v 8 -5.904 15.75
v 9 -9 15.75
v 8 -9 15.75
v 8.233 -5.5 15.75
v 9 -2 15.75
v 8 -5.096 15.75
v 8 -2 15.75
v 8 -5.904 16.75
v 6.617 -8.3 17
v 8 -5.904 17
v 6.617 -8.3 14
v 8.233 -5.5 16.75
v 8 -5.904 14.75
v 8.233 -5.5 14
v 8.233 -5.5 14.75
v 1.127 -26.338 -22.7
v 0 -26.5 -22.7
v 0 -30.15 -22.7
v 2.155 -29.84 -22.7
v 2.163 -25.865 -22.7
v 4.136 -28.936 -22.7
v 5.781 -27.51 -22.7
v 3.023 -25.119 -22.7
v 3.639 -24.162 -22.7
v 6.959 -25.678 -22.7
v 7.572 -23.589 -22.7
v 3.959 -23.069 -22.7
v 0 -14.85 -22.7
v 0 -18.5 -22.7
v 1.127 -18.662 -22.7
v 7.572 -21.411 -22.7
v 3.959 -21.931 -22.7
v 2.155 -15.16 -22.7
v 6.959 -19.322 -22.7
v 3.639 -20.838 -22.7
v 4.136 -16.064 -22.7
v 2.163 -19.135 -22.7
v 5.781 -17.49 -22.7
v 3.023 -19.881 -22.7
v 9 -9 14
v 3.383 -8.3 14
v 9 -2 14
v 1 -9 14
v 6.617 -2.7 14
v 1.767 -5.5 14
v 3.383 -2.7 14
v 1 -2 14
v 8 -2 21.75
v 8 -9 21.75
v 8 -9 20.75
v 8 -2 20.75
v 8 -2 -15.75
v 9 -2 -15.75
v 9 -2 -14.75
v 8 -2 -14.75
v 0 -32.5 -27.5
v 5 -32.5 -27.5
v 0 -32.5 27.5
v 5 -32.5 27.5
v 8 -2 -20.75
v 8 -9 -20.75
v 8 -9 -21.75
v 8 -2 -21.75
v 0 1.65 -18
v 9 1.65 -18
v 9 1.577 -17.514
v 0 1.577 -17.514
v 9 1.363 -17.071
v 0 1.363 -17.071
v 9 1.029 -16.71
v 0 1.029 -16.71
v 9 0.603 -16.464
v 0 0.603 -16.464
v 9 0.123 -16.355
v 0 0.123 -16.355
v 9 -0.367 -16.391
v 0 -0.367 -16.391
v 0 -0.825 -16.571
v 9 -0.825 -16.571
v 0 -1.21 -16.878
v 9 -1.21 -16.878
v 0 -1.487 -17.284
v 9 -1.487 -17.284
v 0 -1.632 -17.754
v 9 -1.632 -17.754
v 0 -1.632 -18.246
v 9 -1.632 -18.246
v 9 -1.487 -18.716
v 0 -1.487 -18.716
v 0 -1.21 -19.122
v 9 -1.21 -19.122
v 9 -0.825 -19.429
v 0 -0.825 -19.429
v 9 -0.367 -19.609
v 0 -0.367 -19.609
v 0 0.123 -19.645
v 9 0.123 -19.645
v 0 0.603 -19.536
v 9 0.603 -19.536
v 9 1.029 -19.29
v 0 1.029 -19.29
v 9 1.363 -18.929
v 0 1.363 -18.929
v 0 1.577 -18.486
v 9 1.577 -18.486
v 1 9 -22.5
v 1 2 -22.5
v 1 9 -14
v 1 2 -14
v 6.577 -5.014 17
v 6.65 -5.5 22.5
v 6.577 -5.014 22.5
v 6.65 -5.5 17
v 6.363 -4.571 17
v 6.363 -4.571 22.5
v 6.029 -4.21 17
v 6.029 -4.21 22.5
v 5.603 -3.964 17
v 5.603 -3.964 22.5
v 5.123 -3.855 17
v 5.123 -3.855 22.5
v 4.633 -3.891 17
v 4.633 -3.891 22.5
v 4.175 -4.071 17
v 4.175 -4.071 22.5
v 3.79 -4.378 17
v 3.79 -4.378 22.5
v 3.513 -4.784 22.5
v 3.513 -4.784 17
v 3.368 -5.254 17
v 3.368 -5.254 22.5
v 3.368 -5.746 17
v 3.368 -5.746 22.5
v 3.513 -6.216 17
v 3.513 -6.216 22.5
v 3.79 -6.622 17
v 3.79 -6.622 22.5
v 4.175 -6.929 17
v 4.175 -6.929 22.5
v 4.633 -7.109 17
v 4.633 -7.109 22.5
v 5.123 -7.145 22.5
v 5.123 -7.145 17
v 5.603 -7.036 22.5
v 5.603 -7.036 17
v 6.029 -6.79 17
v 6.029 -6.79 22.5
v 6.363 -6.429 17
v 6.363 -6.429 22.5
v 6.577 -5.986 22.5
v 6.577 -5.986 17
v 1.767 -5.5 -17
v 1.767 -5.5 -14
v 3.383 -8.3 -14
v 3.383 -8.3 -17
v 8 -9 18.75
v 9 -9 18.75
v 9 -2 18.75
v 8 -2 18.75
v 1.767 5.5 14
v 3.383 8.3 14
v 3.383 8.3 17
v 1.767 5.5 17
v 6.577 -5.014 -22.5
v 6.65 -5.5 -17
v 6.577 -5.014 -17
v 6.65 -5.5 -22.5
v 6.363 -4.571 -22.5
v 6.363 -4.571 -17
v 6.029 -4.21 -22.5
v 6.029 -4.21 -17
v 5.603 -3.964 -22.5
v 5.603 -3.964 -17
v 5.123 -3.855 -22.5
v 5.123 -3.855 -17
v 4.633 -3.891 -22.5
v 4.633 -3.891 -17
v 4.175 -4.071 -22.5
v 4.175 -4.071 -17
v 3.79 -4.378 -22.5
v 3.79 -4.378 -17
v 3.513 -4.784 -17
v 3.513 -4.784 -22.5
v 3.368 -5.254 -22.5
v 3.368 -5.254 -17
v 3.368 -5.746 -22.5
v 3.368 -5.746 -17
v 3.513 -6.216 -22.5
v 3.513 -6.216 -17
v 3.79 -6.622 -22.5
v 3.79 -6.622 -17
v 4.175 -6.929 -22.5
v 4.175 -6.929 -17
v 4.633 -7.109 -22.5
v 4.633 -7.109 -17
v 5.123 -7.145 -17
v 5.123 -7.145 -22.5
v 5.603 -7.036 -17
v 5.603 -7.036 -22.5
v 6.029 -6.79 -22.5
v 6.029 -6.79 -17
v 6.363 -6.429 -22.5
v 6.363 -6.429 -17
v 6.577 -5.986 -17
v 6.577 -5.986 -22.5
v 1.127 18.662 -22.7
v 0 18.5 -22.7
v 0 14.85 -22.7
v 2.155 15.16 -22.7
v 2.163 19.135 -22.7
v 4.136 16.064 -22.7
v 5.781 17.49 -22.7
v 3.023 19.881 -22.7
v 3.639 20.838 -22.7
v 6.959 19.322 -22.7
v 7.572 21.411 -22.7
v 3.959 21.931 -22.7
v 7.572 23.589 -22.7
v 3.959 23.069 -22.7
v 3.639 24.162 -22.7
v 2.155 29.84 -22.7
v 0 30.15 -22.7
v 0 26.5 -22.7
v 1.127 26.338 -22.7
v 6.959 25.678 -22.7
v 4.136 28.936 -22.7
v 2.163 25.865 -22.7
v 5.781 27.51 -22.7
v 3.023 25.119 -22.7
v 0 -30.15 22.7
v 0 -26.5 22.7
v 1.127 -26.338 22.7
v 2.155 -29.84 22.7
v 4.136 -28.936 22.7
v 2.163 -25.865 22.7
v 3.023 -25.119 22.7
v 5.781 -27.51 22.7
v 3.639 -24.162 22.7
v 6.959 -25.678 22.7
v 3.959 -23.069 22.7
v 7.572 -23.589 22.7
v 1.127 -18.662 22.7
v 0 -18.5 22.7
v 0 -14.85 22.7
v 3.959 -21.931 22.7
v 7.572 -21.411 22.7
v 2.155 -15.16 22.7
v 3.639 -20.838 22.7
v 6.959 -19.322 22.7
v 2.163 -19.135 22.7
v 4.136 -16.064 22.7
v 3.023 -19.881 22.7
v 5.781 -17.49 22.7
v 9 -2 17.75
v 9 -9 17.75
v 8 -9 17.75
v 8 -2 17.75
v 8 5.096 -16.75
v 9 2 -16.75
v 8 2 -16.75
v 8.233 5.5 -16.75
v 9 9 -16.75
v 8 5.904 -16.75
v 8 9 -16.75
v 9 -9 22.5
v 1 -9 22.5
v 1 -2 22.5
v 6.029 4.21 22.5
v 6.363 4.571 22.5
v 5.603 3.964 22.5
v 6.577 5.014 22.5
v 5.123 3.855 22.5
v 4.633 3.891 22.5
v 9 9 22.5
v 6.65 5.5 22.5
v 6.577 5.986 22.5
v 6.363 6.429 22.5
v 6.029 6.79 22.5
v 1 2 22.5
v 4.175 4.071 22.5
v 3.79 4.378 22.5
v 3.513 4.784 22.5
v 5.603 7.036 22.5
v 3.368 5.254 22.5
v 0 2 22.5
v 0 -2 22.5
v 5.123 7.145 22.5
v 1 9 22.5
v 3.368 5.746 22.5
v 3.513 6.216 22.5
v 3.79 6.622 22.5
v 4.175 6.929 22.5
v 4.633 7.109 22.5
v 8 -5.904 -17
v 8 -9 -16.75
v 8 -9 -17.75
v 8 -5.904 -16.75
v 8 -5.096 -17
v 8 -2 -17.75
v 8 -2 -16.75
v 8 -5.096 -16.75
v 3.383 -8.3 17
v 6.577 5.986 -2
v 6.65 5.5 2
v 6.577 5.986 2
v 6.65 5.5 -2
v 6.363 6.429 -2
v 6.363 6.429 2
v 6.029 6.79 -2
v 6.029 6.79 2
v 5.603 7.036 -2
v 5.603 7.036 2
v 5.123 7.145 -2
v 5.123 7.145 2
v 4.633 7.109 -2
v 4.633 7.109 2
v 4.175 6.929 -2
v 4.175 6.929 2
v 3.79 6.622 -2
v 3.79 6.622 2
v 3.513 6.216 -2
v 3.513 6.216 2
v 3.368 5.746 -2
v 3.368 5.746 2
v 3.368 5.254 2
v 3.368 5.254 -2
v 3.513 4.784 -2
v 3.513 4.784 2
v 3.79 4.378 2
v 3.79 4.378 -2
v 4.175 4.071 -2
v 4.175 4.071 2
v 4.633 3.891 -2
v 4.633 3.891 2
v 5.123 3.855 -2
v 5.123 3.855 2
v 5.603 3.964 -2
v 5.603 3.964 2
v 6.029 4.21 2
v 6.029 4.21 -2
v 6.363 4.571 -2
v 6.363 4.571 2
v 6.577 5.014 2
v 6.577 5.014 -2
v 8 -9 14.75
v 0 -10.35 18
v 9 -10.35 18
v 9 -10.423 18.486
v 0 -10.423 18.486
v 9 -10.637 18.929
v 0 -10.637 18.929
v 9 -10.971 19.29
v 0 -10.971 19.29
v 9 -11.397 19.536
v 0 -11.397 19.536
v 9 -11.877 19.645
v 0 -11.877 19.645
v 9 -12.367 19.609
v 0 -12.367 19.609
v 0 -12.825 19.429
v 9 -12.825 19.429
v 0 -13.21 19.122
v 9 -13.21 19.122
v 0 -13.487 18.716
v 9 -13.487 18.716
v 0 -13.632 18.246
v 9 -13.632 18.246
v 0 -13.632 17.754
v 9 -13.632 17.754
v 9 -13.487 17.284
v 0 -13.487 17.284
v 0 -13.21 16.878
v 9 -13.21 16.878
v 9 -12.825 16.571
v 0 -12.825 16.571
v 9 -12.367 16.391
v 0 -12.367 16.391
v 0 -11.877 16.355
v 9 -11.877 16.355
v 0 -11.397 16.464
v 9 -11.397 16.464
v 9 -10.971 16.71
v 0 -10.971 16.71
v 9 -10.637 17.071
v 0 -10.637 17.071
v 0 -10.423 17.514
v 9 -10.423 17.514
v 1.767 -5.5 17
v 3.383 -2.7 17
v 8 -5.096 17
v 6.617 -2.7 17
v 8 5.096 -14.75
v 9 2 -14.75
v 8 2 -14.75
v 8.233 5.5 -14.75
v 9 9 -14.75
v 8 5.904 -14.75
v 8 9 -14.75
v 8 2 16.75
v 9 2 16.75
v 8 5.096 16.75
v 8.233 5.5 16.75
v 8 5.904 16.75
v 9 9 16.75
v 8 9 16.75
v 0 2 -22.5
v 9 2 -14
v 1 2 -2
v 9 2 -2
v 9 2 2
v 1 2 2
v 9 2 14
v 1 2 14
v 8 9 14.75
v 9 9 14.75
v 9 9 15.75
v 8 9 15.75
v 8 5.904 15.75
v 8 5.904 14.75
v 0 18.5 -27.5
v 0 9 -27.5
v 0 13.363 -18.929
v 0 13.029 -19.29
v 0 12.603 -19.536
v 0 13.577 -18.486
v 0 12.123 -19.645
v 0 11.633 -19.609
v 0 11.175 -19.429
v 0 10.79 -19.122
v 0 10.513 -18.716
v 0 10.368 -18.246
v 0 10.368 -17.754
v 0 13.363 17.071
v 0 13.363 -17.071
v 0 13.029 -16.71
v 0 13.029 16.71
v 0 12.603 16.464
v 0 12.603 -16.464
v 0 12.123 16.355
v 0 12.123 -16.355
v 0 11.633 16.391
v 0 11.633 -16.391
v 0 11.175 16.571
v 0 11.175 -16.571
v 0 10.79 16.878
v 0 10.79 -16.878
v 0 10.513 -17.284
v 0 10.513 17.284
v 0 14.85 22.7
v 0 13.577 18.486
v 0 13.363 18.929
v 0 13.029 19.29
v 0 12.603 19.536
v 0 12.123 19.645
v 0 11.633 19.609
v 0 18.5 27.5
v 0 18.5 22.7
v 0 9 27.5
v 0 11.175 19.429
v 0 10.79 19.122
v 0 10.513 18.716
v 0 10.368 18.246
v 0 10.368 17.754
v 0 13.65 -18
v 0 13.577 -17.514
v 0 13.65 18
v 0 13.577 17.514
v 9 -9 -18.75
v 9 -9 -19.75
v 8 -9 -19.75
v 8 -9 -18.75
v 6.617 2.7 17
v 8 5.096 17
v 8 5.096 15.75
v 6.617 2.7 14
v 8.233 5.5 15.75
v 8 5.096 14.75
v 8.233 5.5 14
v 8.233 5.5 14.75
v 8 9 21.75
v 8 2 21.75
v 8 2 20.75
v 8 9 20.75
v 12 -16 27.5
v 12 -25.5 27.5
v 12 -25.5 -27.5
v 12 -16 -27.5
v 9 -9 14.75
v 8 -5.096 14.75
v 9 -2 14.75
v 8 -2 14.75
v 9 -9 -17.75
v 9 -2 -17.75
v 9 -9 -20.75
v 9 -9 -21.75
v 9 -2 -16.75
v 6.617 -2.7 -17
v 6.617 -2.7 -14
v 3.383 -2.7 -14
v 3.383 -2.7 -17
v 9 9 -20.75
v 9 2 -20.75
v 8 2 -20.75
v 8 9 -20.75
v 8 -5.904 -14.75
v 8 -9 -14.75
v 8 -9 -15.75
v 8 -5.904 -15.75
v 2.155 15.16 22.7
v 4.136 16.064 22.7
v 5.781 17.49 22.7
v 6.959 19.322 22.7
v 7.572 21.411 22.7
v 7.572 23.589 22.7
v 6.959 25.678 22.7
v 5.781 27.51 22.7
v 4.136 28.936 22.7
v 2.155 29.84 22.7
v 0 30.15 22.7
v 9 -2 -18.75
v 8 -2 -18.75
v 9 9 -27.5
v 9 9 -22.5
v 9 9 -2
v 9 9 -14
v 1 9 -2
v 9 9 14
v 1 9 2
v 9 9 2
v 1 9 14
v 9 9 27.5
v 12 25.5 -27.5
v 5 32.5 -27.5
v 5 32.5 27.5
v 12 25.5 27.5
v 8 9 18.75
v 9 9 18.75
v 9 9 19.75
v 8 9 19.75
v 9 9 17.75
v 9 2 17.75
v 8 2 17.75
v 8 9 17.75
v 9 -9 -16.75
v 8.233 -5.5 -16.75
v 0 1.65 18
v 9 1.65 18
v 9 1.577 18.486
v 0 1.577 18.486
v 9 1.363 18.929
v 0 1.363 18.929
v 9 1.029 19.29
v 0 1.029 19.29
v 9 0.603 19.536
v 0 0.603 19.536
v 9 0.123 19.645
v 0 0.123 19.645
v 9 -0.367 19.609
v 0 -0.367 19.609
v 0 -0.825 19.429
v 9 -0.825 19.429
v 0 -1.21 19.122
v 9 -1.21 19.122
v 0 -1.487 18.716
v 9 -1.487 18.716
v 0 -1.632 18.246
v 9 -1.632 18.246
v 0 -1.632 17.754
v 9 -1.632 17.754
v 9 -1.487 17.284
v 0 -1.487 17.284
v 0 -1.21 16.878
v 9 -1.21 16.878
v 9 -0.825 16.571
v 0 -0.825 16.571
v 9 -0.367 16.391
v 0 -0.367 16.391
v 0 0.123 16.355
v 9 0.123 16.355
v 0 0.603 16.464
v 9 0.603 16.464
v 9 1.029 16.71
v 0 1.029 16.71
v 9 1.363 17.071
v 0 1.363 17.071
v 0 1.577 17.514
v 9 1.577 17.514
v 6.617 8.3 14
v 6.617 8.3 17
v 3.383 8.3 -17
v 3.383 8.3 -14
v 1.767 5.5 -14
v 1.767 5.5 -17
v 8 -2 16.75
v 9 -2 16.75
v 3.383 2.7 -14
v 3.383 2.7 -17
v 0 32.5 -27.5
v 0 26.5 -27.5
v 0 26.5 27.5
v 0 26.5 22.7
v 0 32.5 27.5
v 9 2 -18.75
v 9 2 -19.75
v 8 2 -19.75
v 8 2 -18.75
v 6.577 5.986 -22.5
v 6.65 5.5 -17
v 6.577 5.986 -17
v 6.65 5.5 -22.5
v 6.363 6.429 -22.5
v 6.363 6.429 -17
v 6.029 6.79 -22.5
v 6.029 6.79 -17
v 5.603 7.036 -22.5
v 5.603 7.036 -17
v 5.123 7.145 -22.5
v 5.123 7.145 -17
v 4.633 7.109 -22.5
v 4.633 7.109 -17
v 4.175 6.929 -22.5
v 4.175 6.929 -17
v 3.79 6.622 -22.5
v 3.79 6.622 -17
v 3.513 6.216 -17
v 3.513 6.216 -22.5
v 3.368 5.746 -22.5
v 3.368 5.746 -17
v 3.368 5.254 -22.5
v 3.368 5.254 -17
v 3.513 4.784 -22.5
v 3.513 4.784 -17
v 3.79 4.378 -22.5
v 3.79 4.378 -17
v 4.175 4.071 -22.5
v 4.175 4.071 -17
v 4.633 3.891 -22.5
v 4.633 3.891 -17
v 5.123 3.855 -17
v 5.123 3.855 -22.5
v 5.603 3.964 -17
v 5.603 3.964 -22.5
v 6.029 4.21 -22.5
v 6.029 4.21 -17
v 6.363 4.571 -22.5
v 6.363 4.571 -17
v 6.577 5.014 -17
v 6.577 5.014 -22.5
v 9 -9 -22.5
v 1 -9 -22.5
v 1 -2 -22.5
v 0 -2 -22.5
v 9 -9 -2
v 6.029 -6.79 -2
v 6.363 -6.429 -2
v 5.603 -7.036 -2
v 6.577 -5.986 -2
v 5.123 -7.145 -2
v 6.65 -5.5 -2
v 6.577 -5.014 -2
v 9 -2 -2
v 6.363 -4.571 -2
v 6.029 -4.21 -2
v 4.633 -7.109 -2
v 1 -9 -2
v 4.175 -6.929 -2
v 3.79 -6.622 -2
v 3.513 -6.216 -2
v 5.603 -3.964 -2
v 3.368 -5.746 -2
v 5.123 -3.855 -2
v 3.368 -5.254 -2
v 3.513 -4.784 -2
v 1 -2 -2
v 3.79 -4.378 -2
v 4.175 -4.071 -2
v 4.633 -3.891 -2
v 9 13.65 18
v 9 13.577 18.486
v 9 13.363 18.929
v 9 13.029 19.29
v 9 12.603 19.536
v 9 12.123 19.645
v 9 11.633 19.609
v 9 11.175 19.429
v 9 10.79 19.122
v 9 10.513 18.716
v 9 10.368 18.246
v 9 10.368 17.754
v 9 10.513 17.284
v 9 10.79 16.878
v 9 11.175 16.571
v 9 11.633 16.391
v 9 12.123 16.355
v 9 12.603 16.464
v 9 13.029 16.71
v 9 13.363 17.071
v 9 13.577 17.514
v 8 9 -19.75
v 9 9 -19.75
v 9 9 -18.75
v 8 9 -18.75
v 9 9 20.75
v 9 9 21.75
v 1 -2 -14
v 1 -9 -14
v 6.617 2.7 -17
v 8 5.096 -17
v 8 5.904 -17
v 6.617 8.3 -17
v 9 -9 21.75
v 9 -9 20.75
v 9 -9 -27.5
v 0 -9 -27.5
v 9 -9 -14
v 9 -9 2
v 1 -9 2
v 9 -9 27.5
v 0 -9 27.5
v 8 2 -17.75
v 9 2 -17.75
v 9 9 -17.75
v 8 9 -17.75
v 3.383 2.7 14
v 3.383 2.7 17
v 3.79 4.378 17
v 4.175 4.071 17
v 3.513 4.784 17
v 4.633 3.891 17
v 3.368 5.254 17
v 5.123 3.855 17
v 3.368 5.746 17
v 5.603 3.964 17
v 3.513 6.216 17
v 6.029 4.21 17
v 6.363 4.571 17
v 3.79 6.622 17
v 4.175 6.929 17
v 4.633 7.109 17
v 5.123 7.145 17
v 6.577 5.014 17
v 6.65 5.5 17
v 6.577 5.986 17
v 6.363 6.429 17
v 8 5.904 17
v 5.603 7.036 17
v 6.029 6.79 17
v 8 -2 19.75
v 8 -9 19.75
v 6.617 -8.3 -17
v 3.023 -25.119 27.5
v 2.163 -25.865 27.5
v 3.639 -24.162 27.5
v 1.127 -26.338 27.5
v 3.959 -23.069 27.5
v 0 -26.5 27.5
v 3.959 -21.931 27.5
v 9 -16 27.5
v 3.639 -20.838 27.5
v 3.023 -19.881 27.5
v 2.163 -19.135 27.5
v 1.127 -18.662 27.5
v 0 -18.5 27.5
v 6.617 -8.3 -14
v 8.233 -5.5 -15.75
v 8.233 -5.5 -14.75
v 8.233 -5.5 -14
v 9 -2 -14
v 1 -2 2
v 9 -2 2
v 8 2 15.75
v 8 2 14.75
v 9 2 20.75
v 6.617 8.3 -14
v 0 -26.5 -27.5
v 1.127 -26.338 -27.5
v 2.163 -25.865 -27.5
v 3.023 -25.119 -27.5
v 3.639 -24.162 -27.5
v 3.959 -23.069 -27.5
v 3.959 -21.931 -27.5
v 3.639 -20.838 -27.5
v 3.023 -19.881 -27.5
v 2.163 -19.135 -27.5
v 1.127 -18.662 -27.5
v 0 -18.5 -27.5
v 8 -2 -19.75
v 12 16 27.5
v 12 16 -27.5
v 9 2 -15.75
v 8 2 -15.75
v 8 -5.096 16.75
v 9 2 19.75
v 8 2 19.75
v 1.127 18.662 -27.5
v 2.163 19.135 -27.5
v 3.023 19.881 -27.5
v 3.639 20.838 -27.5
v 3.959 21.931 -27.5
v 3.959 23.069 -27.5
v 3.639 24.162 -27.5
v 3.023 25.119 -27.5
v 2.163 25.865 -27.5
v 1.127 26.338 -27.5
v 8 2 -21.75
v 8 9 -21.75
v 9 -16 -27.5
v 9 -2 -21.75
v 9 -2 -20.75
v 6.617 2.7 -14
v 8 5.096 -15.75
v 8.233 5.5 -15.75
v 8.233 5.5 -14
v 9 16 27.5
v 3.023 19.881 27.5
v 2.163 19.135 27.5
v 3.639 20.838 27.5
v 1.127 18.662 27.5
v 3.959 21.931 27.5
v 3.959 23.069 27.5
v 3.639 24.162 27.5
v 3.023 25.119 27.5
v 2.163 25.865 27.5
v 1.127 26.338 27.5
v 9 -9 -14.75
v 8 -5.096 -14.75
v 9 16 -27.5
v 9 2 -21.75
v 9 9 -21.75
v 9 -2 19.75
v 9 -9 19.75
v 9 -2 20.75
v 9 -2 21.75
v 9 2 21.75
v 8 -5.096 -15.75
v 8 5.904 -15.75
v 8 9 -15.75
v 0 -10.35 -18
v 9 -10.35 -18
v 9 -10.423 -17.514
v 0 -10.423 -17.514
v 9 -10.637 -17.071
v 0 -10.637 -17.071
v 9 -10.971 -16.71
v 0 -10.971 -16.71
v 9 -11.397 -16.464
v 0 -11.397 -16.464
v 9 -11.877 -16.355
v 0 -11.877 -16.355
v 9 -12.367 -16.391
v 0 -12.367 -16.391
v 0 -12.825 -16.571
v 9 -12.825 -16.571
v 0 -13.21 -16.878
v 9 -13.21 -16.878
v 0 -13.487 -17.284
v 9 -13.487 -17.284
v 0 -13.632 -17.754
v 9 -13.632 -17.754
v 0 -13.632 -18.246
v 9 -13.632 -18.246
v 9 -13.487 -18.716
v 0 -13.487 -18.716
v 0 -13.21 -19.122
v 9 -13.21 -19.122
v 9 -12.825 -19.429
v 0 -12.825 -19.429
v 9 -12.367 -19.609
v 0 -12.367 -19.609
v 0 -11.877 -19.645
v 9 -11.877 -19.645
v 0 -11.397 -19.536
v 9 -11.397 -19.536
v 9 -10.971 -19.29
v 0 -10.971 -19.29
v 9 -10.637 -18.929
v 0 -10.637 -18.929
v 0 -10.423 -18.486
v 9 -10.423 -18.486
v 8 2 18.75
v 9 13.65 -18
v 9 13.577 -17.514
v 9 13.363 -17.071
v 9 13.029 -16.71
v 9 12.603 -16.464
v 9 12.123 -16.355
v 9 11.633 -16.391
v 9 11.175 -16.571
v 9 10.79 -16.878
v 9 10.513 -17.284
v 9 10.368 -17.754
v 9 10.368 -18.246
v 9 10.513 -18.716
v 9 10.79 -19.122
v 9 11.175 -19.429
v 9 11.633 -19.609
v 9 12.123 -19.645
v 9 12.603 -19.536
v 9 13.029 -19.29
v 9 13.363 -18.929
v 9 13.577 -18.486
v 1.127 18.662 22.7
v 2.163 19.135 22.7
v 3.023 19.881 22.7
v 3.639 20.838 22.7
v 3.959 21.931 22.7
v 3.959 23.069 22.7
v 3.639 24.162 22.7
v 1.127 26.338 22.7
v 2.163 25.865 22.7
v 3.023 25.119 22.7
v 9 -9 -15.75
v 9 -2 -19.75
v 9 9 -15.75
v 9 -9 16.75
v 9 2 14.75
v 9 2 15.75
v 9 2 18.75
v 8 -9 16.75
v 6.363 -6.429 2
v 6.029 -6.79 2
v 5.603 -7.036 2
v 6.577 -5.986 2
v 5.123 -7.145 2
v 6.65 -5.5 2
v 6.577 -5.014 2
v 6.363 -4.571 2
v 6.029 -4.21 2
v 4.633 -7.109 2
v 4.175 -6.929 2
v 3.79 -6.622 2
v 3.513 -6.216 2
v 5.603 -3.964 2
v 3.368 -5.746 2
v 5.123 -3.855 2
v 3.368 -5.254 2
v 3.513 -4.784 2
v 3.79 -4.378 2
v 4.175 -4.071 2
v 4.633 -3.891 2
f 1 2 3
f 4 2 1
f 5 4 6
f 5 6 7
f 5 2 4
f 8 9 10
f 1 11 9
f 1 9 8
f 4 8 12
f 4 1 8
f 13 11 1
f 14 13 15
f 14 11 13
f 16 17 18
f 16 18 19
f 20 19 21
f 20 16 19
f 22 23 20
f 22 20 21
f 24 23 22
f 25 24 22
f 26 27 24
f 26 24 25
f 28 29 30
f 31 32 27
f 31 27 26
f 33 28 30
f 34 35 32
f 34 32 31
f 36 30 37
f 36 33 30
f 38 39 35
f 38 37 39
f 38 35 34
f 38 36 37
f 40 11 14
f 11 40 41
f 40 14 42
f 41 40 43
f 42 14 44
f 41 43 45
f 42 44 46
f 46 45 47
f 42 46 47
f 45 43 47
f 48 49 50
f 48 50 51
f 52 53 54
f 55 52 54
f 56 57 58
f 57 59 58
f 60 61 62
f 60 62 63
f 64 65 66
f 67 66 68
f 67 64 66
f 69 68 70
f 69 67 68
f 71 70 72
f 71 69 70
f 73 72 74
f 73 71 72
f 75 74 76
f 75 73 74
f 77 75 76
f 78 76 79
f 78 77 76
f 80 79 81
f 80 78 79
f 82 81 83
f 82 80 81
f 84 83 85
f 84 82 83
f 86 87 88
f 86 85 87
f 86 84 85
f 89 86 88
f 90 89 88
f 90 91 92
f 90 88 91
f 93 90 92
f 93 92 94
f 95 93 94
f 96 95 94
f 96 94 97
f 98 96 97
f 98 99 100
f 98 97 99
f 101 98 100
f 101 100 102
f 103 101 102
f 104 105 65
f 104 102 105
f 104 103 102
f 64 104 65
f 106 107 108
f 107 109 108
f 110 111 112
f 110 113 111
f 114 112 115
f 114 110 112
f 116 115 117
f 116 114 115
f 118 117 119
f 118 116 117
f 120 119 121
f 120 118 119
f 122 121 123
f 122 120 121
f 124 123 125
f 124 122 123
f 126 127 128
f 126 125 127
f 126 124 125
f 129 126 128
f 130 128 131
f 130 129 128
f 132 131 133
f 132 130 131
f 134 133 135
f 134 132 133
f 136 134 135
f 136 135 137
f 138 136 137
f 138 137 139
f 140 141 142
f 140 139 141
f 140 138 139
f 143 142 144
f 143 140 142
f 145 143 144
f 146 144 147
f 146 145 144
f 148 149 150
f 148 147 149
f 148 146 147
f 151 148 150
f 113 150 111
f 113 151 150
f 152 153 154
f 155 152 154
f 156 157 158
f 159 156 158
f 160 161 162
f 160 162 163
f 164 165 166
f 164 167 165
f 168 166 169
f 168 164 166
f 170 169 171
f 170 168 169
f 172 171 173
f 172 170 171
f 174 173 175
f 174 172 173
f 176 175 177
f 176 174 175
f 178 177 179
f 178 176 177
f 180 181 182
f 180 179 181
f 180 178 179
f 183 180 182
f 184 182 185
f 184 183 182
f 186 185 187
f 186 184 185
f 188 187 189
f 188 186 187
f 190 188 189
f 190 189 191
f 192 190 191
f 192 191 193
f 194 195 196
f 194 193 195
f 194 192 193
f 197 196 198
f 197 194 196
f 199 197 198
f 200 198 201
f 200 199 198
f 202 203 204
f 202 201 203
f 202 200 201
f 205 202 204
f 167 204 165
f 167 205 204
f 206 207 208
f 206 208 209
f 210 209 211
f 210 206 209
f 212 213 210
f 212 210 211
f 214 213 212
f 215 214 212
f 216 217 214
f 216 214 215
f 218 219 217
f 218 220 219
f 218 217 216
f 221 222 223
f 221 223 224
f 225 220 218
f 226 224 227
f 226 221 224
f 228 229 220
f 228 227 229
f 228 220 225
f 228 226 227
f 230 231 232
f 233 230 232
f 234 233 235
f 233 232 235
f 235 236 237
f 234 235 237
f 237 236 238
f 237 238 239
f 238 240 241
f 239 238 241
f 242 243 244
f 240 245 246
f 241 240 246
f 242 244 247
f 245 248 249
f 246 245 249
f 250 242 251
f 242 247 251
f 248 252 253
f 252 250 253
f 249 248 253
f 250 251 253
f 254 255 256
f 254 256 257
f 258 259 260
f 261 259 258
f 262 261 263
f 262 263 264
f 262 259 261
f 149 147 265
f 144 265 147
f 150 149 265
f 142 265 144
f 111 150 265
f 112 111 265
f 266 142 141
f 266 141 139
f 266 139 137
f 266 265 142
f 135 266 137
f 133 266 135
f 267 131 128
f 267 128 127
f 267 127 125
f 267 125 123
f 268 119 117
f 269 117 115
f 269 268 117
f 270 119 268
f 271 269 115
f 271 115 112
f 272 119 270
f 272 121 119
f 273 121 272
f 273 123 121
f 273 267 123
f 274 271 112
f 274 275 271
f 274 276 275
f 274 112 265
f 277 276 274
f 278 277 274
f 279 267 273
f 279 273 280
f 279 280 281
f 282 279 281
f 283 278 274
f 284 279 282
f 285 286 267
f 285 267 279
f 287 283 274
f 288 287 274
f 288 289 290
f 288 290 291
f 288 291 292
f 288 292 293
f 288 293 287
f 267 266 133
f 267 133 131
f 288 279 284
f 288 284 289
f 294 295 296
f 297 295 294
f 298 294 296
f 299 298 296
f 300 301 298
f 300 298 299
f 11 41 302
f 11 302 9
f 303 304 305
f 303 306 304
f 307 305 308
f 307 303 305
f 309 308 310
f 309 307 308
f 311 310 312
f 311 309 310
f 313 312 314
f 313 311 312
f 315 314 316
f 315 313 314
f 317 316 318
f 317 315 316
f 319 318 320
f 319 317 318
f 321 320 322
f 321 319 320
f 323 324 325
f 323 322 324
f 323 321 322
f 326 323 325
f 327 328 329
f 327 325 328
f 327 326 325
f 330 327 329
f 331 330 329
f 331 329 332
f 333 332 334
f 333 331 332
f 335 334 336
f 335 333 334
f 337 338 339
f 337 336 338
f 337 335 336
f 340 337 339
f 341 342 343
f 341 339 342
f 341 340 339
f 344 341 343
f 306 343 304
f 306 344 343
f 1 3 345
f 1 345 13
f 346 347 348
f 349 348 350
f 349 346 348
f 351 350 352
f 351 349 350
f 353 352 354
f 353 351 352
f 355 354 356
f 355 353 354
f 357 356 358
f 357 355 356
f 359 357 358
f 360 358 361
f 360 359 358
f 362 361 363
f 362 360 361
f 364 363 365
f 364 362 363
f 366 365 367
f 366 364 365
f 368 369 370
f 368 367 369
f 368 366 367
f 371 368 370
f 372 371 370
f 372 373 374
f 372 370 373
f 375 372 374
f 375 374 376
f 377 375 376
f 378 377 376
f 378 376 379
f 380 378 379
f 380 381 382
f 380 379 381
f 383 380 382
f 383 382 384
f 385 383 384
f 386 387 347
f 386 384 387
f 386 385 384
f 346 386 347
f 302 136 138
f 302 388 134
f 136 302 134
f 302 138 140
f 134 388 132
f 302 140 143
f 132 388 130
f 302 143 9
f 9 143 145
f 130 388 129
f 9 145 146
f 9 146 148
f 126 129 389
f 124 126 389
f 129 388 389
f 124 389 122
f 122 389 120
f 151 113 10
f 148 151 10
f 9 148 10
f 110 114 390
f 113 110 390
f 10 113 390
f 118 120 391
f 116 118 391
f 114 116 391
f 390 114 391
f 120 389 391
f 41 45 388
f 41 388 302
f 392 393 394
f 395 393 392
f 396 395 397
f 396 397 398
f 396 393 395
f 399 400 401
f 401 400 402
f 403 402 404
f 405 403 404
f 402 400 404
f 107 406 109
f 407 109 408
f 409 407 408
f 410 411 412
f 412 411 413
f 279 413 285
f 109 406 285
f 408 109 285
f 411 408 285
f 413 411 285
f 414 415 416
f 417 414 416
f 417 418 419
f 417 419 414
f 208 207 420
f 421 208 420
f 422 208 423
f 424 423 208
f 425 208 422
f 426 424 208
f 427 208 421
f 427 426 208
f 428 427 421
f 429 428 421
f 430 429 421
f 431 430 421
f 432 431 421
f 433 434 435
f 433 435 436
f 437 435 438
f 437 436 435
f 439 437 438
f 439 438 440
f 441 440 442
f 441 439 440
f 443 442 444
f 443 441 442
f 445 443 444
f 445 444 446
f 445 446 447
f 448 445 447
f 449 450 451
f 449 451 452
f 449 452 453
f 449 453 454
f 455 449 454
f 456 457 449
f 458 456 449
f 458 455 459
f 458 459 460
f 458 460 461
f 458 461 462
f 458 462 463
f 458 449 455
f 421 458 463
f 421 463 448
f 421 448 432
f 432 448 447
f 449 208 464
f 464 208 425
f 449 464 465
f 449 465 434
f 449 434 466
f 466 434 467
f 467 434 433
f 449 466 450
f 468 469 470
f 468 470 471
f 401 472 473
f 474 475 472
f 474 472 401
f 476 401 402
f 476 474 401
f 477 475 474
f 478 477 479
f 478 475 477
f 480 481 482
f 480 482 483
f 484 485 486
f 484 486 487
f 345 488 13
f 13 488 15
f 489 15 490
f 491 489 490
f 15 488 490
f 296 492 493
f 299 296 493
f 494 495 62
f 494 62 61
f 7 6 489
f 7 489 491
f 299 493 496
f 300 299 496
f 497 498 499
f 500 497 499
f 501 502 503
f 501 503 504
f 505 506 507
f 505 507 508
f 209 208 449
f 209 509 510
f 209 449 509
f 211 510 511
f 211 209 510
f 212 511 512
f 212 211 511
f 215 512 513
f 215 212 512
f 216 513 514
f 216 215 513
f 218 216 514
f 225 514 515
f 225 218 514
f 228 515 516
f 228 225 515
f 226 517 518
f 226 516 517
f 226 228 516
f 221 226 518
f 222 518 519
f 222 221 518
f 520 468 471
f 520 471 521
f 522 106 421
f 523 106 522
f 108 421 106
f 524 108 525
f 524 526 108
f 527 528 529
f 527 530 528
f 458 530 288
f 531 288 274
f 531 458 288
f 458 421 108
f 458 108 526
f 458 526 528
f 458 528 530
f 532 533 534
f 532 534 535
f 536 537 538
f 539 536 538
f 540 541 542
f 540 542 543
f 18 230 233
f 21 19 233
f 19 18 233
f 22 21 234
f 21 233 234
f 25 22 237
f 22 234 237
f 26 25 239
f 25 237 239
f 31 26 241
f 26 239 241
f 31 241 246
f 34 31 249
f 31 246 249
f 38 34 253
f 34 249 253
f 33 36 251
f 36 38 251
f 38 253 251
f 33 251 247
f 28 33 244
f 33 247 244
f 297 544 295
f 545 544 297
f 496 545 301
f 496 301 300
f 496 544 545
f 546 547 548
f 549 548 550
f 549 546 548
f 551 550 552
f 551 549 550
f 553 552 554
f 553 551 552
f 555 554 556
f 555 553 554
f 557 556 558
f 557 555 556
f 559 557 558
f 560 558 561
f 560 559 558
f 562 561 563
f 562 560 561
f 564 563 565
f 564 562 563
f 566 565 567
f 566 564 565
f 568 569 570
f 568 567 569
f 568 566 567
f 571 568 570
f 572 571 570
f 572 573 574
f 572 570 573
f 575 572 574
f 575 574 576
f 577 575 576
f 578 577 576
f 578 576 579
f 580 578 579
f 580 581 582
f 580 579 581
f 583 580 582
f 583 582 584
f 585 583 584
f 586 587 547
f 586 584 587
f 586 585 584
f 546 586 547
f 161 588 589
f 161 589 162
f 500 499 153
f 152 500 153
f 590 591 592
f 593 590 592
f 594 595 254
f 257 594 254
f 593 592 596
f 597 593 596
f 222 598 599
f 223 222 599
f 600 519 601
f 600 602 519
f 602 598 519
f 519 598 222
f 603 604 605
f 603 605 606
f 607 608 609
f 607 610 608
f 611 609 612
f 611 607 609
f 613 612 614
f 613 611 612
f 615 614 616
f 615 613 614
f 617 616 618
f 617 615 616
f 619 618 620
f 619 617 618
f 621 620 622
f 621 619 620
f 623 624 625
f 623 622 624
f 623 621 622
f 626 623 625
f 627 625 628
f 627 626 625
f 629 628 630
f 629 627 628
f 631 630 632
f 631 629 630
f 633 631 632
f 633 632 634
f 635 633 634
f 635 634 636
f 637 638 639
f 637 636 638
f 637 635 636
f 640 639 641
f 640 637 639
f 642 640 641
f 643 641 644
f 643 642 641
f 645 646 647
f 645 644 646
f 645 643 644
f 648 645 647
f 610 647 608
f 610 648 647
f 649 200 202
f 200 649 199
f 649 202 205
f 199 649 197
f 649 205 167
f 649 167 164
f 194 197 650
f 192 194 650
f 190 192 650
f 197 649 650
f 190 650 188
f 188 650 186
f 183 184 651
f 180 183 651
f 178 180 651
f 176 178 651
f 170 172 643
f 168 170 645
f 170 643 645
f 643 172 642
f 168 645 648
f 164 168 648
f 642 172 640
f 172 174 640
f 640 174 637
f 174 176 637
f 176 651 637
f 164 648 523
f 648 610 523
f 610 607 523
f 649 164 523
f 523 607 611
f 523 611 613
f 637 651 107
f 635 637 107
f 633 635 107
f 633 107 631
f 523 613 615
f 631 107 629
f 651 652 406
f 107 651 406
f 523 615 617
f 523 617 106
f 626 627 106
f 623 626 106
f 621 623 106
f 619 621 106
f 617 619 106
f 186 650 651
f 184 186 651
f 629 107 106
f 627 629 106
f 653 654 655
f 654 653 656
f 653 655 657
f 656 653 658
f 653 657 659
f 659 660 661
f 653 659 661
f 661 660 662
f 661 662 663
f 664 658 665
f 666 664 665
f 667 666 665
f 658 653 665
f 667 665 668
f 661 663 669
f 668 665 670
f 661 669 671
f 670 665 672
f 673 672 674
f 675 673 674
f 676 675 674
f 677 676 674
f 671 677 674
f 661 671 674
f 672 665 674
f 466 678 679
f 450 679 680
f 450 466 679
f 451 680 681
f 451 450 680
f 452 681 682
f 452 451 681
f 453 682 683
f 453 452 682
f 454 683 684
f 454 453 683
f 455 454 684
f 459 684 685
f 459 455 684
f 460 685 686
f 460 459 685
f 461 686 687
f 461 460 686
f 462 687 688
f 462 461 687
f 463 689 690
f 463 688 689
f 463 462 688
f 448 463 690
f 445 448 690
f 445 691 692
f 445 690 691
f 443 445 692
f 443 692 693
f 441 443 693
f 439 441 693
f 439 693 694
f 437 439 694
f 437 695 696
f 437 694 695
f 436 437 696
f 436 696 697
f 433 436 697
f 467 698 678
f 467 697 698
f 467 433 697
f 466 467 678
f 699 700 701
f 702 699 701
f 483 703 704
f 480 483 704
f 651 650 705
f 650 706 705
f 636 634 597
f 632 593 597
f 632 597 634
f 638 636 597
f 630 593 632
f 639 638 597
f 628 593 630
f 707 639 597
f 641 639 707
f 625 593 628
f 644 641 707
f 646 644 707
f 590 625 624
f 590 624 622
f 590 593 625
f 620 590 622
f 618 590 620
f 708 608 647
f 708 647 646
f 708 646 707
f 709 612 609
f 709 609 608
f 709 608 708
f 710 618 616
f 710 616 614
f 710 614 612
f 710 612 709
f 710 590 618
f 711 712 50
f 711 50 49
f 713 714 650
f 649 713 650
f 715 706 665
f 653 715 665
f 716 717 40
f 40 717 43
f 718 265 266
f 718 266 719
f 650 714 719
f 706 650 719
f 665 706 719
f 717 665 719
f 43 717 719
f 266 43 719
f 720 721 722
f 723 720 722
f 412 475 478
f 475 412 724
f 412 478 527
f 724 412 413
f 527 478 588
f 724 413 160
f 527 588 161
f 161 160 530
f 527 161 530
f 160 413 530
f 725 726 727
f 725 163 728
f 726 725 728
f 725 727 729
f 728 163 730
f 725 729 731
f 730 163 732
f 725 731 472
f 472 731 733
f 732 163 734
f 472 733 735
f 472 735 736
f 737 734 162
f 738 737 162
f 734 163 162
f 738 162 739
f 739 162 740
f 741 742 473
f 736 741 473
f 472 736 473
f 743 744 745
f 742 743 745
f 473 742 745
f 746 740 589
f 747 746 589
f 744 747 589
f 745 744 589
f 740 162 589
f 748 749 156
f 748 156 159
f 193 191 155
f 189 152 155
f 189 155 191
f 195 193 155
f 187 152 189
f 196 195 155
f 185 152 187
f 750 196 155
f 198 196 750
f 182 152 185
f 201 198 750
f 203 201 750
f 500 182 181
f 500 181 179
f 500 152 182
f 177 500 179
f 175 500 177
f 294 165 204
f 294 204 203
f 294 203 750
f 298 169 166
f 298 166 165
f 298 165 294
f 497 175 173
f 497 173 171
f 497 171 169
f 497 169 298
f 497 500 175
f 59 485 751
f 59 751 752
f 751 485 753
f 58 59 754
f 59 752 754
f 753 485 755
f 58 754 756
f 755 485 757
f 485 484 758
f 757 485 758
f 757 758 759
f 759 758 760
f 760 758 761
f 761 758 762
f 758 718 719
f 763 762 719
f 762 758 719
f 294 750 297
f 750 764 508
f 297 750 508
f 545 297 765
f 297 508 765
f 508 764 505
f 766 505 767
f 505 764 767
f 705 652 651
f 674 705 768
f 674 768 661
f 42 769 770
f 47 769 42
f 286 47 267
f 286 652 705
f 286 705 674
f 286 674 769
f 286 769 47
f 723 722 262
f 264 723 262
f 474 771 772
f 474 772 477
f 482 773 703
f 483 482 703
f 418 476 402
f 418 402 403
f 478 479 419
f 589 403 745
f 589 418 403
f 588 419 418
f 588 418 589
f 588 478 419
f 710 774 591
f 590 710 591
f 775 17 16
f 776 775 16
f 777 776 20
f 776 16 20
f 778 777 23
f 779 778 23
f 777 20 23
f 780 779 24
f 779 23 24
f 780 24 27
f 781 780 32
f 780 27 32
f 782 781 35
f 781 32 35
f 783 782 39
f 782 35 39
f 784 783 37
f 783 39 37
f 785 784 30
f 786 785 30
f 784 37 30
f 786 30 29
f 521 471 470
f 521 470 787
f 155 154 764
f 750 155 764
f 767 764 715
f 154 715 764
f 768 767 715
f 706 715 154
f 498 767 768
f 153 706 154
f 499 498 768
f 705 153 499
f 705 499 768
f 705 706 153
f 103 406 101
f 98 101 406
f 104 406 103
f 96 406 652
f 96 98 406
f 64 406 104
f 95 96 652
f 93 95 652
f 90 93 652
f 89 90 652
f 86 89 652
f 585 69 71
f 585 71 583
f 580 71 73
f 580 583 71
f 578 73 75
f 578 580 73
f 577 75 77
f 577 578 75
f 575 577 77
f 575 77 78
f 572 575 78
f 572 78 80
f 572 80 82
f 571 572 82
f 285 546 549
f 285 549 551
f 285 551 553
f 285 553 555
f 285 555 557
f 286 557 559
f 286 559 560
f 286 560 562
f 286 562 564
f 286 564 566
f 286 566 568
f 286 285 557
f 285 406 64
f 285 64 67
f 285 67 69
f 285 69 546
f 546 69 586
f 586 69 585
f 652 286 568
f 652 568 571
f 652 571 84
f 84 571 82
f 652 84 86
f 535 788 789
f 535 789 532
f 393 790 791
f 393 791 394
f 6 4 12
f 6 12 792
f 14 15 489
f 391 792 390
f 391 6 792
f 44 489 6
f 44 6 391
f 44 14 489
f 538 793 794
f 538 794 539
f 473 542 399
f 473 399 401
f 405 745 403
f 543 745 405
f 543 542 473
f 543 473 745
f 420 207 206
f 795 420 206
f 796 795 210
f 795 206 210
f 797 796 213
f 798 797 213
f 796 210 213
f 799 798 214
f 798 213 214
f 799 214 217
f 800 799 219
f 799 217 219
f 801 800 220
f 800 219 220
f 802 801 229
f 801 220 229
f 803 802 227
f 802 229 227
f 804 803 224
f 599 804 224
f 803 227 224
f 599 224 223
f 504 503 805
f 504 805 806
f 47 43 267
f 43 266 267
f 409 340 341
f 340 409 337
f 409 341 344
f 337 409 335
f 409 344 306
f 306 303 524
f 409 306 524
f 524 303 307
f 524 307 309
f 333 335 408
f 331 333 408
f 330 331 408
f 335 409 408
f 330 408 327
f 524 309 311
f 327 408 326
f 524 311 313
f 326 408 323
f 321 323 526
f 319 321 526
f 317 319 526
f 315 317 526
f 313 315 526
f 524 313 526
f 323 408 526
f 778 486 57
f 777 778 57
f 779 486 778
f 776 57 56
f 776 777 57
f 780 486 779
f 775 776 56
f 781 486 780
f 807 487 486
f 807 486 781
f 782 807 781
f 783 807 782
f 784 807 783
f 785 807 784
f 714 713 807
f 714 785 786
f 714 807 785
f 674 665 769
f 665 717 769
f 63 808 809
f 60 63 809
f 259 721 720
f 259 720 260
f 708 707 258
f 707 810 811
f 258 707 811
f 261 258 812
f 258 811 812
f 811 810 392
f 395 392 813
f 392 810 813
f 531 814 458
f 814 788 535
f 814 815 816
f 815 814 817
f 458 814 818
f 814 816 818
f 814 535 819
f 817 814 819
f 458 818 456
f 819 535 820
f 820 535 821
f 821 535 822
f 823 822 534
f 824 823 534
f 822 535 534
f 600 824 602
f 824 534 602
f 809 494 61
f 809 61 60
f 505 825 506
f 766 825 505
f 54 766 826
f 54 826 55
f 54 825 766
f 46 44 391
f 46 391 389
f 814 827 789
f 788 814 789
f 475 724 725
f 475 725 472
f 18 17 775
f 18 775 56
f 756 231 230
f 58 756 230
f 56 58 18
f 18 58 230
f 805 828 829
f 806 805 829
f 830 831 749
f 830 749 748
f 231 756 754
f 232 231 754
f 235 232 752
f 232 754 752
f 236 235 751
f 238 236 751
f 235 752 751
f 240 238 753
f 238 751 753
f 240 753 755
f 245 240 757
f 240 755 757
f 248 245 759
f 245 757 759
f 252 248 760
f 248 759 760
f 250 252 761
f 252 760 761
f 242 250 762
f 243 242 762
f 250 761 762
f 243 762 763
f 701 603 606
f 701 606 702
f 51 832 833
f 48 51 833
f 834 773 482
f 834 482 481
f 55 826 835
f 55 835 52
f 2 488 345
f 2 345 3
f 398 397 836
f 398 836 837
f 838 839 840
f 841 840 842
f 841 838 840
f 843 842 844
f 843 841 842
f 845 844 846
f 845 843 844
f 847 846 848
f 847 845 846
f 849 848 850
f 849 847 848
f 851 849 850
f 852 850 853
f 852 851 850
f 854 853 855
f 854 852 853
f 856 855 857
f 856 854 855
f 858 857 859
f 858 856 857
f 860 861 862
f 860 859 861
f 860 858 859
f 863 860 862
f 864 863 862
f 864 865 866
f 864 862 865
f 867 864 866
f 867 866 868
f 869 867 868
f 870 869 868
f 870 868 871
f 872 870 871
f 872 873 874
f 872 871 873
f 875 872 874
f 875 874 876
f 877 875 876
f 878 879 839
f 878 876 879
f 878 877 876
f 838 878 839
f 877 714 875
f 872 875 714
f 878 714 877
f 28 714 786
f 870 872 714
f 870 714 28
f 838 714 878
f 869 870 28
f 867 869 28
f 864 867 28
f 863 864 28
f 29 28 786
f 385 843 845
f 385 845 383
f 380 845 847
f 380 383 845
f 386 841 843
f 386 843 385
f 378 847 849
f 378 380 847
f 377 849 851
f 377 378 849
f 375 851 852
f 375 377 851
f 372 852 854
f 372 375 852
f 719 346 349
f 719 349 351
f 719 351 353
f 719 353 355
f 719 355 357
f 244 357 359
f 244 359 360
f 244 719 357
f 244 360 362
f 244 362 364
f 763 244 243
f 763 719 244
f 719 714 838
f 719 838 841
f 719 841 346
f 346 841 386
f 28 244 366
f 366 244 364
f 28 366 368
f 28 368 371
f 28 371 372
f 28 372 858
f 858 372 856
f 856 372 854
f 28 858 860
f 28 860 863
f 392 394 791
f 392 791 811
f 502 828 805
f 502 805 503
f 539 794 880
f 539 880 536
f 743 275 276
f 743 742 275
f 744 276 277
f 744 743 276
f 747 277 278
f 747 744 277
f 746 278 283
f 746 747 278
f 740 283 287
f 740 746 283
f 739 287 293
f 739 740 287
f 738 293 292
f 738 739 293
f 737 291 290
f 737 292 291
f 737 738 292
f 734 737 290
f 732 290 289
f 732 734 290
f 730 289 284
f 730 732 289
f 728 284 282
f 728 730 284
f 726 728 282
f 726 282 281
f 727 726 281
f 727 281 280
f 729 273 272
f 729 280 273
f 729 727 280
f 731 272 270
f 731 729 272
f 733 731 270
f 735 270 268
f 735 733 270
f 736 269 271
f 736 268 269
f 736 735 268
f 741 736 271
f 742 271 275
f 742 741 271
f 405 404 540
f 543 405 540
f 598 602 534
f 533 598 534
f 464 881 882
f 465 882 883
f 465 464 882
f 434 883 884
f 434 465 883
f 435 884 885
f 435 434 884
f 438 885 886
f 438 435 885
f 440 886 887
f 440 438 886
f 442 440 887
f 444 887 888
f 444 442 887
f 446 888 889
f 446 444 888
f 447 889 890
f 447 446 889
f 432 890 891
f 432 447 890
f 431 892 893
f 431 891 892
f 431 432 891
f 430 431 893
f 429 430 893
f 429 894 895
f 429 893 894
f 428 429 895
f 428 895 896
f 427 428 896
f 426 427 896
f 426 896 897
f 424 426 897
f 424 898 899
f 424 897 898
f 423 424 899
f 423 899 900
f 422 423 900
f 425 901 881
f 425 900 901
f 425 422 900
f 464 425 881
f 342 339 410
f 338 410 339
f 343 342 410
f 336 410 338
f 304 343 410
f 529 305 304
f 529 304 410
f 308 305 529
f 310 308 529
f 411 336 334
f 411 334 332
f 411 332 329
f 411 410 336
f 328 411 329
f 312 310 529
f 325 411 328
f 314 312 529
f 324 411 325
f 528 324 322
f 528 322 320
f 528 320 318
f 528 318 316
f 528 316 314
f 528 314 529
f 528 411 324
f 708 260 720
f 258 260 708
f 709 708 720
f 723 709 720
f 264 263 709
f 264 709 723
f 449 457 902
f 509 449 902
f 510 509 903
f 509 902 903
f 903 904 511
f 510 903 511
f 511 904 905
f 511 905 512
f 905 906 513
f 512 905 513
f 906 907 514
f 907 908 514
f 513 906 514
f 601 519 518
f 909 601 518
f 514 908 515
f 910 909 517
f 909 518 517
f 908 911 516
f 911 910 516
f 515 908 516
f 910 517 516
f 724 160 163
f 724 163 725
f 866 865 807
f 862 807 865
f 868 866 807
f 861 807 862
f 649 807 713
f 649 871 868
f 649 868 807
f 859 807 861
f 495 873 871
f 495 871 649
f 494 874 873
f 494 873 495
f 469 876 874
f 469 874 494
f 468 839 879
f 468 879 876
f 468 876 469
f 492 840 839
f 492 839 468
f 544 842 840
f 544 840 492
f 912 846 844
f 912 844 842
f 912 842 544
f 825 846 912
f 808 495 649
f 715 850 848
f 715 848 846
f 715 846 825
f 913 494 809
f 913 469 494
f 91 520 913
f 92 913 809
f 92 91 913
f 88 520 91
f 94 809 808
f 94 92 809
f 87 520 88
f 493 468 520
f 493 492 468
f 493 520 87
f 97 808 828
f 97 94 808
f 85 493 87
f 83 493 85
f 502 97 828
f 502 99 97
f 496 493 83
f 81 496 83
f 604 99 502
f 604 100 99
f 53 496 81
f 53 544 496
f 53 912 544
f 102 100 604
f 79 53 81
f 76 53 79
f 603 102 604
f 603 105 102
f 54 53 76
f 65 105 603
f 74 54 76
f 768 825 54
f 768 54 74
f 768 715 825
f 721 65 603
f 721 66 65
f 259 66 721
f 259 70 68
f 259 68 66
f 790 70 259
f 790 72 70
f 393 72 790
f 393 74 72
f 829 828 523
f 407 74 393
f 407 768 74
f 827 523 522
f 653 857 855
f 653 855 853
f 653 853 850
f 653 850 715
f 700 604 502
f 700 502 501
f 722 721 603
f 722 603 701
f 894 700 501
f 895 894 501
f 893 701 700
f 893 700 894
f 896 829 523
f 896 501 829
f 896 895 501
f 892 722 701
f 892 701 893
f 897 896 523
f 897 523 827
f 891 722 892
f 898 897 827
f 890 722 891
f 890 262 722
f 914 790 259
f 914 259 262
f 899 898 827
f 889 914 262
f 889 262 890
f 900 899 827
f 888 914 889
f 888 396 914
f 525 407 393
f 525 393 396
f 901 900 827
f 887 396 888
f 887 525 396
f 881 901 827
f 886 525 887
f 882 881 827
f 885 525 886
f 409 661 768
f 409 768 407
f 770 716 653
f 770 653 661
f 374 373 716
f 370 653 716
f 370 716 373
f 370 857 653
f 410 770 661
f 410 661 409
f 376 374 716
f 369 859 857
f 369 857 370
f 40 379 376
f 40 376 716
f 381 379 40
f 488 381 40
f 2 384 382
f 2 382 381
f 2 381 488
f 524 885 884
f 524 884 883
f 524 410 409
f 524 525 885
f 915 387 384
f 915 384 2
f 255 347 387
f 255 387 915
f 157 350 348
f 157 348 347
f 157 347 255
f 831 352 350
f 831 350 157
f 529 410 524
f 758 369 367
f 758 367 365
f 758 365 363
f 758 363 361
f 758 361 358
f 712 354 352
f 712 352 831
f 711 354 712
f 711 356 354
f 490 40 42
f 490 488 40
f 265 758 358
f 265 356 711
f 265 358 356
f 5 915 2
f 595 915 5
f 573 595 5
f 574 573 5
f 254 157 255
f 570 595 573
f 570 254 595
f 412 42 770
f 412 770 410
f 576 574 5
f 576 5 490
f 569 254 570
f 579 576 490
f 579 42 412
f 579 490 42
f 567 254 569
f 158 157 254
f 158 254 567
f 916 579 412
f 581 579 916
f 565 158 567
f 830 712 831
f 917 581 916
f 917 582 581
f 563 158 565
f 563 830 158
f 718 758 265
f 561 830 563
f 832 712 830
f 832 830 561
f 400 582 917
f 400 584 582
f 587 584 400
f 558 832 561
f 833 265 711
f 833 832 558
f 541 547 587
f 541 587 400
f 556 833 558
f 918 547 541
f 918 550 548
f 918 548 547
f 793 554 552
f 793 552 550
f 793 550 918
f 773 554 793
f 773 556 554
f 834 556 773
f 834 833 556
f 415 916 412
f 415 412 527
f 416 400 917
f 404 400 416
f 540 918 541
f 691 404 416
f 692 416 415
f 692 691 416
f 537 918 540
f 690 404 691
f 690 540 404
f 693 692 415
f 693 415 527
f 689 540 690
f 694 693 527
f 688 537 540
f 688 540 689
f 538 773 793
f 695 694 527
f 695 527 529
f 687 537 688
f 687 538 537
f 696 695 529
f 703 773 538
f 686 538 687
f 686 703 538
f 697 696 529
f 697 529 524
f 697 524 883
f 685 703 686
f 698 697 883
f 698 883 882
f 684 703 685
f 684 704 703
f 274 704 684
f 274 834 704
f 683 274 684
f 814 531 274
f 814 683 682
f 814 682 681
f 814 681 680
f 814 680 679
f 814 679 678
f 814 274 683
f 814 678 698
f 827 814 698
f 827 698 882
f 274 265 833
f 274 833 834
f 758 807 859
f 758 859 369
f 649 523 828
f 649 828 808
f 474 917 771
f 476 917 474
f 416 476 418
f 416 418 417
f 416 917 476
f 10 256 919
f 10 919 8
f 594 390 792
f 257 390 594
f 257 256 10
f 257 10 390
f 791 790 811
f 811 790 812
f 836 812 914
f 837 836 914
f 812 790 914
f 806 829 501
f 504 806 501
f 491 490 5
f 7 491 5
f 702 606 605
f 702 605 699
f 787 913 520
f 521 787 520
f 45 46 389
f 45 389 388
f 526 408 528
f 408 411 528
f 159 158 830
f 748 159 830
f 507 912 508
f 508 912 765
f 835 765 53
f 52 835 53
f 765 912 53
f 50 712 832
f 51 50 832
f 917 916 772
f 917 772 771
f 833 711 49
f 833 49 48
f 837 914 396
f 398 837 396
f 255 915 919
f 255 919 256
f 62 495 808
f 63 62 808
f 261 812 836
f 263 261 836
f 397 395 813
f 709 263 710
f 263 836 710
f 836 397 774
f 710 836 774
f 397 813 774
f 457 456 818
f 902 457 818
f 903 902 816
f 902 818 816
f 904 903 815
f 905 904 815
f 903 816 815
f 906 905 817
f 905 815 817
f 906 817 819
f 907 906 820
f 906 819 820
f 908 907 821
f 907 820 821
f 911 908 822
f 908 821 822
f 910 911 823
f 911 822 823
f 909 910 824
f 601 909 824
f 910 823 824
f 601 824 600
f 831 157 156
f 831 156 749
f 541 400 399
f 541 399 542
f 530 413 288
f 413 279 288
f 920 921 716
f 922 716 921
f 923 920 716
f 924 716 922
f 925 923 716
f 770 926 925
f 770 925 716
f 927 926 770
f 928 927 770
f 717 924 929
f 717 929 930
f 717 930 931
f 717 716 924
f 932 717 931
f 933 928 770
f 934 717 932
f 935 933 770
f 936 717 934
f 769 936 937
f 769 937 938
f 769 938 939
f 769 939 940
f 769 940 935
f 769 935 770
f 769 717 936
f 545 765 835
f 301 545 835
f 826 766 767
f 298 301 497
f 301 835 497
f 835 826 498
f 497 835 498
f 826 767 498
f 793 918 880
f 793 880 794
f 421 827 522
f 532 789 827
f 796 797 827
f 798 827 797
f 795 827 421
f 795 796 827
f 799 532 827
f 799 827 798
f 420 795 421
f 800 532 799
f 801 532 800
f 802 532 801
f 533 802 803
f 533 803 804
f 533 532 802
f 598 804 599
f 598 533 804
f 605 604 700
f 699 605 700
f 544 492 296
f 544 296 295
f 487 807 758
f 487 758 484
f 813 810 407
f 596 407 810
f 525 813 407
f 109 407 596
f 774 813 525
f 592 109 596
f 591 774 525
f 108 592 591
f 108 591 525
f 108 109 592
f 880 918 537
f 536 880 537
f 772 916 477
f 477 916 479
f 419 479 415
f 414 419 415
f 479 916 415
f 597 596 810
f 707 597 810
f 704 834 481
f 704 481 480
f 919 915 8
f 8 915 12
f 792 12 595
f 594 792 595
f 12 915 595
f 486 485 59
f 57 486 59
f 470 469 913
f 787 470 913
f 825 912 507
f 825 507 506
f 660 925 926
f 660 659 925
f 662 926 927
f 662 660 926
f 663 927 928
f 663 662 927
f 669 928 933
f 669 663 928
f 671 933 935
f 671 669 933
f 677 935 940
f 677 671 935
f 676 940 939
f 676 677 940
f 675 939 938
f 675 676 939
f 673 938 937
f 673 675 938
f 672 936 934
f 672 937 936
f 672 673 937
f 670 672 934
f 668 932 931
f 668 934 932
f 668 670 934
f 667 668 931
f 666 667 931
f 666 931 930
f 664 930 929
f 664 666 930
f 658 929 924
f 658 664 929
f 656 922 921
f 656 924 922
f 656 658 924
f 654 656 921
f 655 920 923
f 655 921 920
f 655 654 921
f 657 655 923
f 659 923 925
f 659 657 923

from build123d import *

# Parameters (mm, degrees)
SKETCH_R             = 1.65
PAD_DEPTH            = 27.5
SKETCH001_R          = 7.65
POCKET_DEPTH         = 22.7
SKETCH002_W          = 2
SKETCH002_H          = 7
POCKET001_DEPTH      = 27.501
POCKET001_DEPTH_BACK = -27.501
SKETCH003_W          = 18
SKETCH003_H          = 5
POCKET002_DEPTH      = 0.001
POCKET002_DEPTH_BACK = -17.501
SKETCH004_W          = 23.804039
SKETCH004_H          = 32
POCKET003_DEPTH      = 27.501
POCKET003_DEPTH_BACK = -27.501
SKETCH005_W          = 7
SKETCH005_H          = 12
POCKET004_DEPTH      = 17.501
POCKET005_DEPTH      = 3
SKETCH007_W          = 24.471905
SKETCH007_H          = 61.781853
POCKET006_DEPTH      = 27.501
POCKET006_DEPTH_BACK = -27.501
SKETCH008_R          = 1.65
POCKET007_DEPTH      = 12.001
POCKET008_DEPTH      = 3
SKETCH010_W          = 7
SKETCH010_H          = 1
POCKET009_DEPTH      = 1


with BuildPart() as part:
    # Sketch → Pad (new body, symmetric)
    with BuildSketch(Plane.XY):
        with BuildLine():
            Line((0, 32.5), (5, 32.5))
            Line((5, 32.5), (17.5, 20))
            Line((17.5, 20), (17.5, -20))
            Line((17.5, -20), (5, -32.5))
            Line((5, -32.5), (0, -32.5))
            Line((0, -26.5), (0, -32.5))
            ThreePointArc((0, -26.5), (4, -22.5), (0, -18.5))
            Line((0, 18.5), (0, -18.5))
            ThreePointArc((0, 18.5), (4, 22.5), (0, 26.5))
            Line((0, 32.5), (0, 26.5))
        make_face()
        with Locations((5, 5.5)):
            Circle(SKETCH_R, mode=Mode.SUBTRACT)
        with Locations((5, -5.5)):
            Circle(SKETCH_R, mode=Mode.SUBTRACT)
    extrude(amount=PAD_DEPTH, both=True)

    # Sketch001 → Pocket (cut, symmetric)
    with BuildSketch(Plane.XY):
        with Locations((0, 22.5)):
            Circle(SKETCH001_R)
        with Locations((0, -22.5)):
            Circle(SKETCH001_R)
    extrude(amount=POCKET_DEPTH, both=True, mode=Mode.SUBTRACT)

    # Sketch002 → Pocket001 (cut, two sides)
    with BuildSketch(Plane.XY) as pocket001_sk:
        with Locations((0, 5.5)):
            Rectangle(SKETCH002_W, SKETCH002_H)
        with Locations((0, -5.5)):
            Rectangle(SKETCH002_W, SKETCH002_H)
    extrude(amount=-POCKET001_DEPTH, mode=Mode.SUBTRACT)
    extrude(pocket001_sk.sketch, amount=-POCKET001_DEPTH_BACK, mode=Mode.SUBTRACT)

    # Sketch003 → Pocket002 (cut, two sides)
    with BuildSketch(Plane.YZ) as pocket002_sk:
        with Locations((0, 25)):
            Rectangle(SKETCH003_W, SKETCH003_H)
        with Locations((0, -25)):
            Rectangle(SKETCH003_W, SKETCH003_H)
    extrude(amount=-POCKET002_DEPTH, mode=Mode.SUBTRACT)
    extrude(pocket002_sk.sketch, amount=-POCKET002_DEPTH_BACK, mode=Mode.SUBTRACT)

    # Sketch004 → Pocket003 (cut, two sides)
    with BuildSketch(Plane.XY) as pocket003_sk:
        with Locations((20.902019, 0)):
            Rectangle(SKETCH004_W, SKETCH004_H)
    extrude(amount=-POCKET003_DEPTH, mode=Mode.SUBTRACT)
    extrude(pocket003_sk.sketch, amount=-POCKET003_DEPTH_BACK, mode=Mode.SUBTRACT)

    # Sketch005 → Pocket004 (cut, through all)
    with BuildSketch(Plane.YZ):
        with Locations((-5.5, 8)):
            Rectangle(SKETCH005_W, SKETCH005_H)
        with Locations((-5.5, -8)):
            Rectangle(SKETCH005_W, SKETCH005_H)
        with Locations((5.5, 8)):
            Rectangle(SKETCH005_W, SKETCH005_H)
        with Locations((5.5, -8)):
            Rectangle(SKETCH005_W, SKETCH005_H)
    extrude(amount=POCKET004_DEPTH, mode=Mode.SUBTRACT)

    # Sketch006 (on DatumPlane) → Pocket005 (cut)
    with BuildSketch(Plane.XY.offset(14)):
        Polygon((8.233162, 5.5), (6.616581, 8.3), (3.383419, 8.3), (1.766838, 5.5), (3.383419, 2.7), (6.616581, 2.7), align=None)
        Polygon((8.233162, -5.5), (6.616581, -2.7), (3.383419, -2.7), (1.766838, -5.5), (3.383419, -8.3), (6.616581, -8.3), align=None)
    extrude(amount=POCKET005_DEPTH, mode=Mode.SUBTRACT)

    # Sketch007 → Pocket006 (cut, two sides)
    with BuildSketch(Plane.XY) as pocket006_sk:
        with Locations((24.235952, 0.497813)):
            Rectangle(SKETCH007_W, SKETCH007_H)
    extrude(amount=-POCKET006_DEPTH, mode=Mode.SUBTRACT)
    extrude(pocket006_sk.sketch, amount=-POCKET006_DEPTH_BACK, mode=Mode.SUBTRACT)

    # Sketch008 → Pocket007 (cut, through all)
    with BuildSketch(Plane.YZ):
        with Locations((12, 18)):
            Circle(SKETCH008_R)
        with Locations((-12, 18)):
            Circle(SKETCH008_R)
        with Locations((0, 18)):
            Circle(SKETCH008_R)
        with Locations((0, -18)):
            Circle(SKETCH008_R)
        with Locations((-12, -18)):
            Circle(SKETCH008_R)
        with Locations((12, -18)):
            Circle(SKETCH008_R)
    extrude(amount=POCKET007_DEPTH, mode=Mode.SUBTRACT)

    # Sketch009 (on DatumPlane) → Pocket008 (cut)
    with BuildSketch(Plane.XY.offset(-14)):
        Polygon((3.383419, 2.7), (6.616581, 2.7), (8.233162, 5.5), (6.616581, 8.3), (3.383419, 8.3), (1.766838, 5.5), align=None)
        Polygon((8.233162, -5.5), (6.616581, -2.7), (3.383419, -2.7), (1.766838, -5.5), (3.383419, -8.3), (6.616581, -8.3), align=None)
    extrude(amount=-POCKET008_DEPTH, mode=Mode.SUBTRACT)

    # Sketch010 (on DatumPlane) → Pocket009 (cut)
    with BuildSketch(Plane.YZ.offset(9)):
        with Locations((-5.5, 15.25)):
            Rectangle(SKETCH010_W, SKETCH010_H)
        with Locations((-5.5, 17.25)):
            Rectangle(SKETCH010_W, SKETCH010_H)
        with Locations((-5.5, 19.25)):
            Rectangle(SKETCH010_W, SKETCH010_H)
        with Locations((-5.5, 21.25)):
            Rectangle(SKETCH010_W, SKETCH010_H)
        with Locations((5.5, 15.25)):
            Rectangle(SKETCH010_W, SKETCH010_H)
        with Locations((5.5, 17.25)):
            Rectangle(SKETCH010_W, SKETCH010_H)
        with Locations((5.5, 19.25)):
            Rectangle(SKETCH010_W, SKETCH010_H)
        with Locations((5.5, 21.25)):
            Rectangle(SKETCH010_W, SKETCH010_H)
        with Locations((-5.5, -21.25)):
            Rectangle(SKETCH010_W, SKETCH010_H)
        with Locations((-5.5, -19.25)):
            Rectangle(SKETCH010_W, SKETCH010_H)
        with Locations((-5.5, -17.25)):
            Rectangle(SKETCH010_W, SKETCH010_H)
        with Locations((-5.5, -15.25)):
            Rectangle(SKETCH010_W, SKETCH010_H)
        with Locations((5.5, -21.25)):
            Rectangle(SKETCH010_W, SKETCH010_H)
        with Locations((5.5, -19.25)):
            Rectangle(SKETCH010_W, SKETCH010_H)
        with Locations((5.5, -17.25)):
            Rectangle(SKETCH010_W, SKETCH010_H)
        with Locations((5.5, -15.25)):
            Rectangle(SKETCH010_W, SKETCH010_H)
    extrude(amount=-POCKET009_DEPTH, mode=Mode.SUBTRACT)


solid = part.part
